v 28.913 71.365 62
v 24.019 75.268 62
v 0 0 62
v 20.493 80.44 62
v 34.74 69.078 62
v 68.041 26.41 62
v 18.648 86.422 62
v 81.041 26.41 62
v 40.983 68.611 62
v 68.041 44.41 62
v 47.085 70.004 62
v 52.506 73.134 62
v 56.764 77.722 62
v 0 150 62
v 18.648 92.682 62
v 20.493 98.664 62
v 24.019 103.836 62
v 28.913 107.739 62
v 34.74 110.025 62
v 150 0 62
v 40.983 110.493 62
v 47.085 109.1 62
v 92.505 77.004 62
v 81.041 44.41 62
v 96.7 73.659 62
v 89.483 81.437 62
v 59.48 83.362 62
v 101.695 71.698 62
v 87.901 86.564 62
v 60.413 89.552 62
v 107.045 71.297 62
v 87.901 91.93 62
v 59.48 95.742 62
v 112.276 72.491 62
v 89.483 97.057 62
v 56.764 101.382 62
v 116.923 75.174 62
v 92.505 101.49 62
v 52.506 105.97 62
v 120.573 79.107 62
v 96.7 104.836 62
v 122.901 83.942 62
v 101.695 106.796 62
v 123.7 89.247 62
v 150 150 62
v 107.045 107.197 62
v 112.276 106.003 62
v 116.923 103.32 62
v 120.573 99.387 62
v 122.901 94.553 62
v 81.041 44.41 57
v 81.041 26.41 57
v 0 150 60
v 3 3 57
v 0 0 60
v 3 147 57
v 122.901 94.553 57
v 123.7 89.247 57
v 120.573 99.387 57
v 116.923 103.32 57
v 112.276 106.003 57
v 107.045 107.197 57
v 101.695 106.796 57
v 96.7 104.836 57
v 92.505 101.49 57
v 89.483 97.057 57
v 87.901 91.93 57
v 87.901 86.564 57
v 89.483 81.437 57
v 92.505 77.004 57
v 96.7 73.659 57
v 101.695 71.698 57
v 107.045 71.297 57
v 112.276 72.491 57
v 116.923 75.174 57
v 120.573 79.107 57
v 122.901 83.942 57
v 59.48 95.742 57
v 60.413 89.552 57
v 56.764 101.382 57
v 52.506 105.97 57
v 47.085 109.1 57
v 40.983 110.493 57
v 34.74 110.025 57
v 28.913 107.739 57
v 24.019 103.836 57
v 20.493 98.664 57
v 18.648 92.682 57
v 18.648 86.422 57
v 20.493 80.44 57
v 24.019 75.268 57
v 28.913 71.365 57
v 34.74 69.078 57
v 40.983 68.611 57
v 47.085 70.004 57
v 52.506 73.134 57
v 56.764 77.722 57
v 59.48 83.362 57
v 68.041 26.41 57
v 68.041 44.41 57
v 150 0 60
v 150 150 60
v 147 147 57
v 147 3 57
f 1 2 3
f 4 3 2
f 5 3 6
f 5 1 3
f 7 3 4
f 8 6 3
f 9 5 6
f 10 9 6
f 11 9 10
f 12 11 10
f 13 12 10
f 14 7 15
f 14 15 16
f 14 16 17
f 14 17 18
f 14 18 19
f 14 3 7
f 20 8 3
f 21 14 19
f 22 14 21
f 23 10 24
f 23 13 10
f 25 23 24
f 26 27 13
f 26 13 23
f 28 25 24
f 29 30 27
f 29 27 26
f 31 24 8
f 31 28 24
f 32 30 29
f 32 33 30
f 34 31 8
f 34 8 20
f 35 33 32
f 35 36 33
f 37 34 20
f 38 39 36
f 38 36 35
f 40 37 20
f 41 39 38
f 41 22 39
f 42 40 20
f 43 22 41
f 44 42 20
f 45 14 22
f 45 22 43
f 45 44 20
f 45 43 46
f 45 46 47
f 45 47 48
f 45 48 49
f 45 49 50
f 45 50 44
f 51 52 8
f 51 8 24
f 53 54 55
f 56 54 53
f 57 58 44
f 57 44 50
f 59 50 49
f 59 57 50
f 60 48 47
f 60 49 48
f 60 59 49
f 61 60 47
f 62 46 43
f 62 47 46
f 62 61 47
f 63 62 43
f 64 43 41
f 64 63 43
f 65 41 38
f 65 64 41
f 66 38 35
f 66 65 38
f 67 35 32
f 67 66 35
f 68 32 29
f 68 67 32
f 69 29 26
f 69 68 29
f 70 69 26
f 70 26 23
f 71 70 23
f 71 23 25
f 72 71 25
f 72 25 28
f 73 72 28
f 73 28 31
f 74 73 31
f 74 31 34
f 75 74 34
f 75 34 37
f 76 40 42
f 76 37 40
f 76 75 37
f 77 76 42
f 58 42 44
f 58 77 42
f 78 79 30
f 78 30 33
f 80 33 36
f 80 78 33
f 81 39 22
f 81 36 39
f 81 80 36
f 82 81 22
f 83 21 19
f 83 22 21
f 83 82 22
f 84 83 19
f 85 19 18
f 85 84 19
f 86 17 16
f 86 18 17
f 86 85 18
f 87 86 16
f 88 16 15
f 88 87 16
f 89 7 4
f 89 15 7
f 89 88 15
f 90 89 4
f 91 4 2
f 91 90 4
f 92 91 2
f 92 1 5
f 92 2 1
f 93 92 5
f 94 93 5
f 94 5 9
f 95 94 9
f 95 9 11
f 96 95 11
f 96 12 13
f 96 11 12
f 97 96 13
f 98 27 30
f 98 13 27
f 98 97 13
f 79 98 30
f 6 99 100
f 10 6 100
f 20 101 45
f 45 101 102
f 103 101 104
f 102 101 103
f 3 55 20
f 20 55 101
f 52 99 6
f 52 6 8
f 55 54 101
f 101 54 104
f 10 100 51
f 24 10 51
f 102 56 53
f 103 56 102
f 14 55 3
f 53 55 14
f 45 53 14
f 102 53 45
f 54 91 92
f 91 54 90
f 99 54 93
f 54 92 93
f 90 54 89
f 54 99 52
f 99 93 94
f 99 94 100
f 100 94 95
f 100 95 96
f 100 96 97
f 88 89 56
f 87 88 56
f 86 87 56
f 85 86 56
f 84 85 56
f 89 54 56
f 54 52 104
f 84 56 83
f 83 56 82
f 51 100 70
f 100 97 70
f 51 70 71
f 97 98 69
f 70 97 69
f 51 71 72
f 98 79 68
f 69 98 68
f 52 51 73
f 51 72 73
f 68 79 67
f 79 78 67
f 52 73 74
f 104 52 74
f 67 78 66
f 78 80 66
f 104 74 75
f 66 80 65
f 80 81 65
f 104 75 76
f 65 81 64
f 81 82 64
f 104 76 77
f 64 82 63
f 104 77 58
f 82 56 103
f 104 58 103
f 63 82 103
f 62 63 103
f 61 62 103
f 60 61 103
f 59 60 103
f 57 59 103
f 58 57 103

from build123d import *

# Parameters (mm, degrees)
SKETCH002_R      = 21
SKETCH002_R_2    = 18
SKETCH002_W      = 13
SKETCH002_H      = 18
EXTRUDE002_DEPTH = 10
BOX002_W         = 150
BOX002_H         = 150
BOX002_DEPTH     = 5
CHAMFER_SIZE     = 3


with BuildPart() as extrude002:
    # Sketch002 (on Face6 of Box002) → Extrude002 (new body)
    with BuildSketch(Plane.XY.offset(5)):
        with Locations((39.413204, 89.551971)):
            Circle(SKETCH002_R)
        with Locations((105.700333, 89.247101)):
            Circle(SKETCH002_R_2)
        with Locations((74.540915, 35.410171)):
            Rectangle(SKETCH002_W, SKETCH002_H)
    extrude(amount=EXTRUDE002_DEPTH)


with BuildPart() as extrude002_1:
    # Extrude002 placement: moved
    add(extrude002.part.moved(Location((0, 0, -7))))


with BuildPart() as tapacaja003:
    # Box002 → Box002 (new body)
    with BuildSketch(Plane.XY):
        with Locations((75, 75)):
            Rectangle(BOX002_W, BOX002_H)
    extrude(amount=BOX002_DEPTH)

    # Cut002: cut Extrude002
    add(extrude002_1.part, mode=Mode.SUBTRACT)


with BuildPart() as tapacaja003_1:
    # Cut002 placement: moved
    add(tapacaja003.part.moved(Location((0, 0, 61))))

    # Chamfer
    chamfer_edges = [tapacaja003_1.edges().sort_by_distance(p)[0] for p in [
        (0, 75, 61),
        (75, 0, 61),
        (75, 150, 61),
        (150, 75, 61),
    ]]
    chamfer(chamfer_edges, length=CHAMFER_SIZE)


with BuildPart() as tapacaja003_2:
    # Chamfer placement: moved
    add(tapacaja003_1.part.moved(Location((0, 0, -4))))


solid = tapacaja003_2.part
